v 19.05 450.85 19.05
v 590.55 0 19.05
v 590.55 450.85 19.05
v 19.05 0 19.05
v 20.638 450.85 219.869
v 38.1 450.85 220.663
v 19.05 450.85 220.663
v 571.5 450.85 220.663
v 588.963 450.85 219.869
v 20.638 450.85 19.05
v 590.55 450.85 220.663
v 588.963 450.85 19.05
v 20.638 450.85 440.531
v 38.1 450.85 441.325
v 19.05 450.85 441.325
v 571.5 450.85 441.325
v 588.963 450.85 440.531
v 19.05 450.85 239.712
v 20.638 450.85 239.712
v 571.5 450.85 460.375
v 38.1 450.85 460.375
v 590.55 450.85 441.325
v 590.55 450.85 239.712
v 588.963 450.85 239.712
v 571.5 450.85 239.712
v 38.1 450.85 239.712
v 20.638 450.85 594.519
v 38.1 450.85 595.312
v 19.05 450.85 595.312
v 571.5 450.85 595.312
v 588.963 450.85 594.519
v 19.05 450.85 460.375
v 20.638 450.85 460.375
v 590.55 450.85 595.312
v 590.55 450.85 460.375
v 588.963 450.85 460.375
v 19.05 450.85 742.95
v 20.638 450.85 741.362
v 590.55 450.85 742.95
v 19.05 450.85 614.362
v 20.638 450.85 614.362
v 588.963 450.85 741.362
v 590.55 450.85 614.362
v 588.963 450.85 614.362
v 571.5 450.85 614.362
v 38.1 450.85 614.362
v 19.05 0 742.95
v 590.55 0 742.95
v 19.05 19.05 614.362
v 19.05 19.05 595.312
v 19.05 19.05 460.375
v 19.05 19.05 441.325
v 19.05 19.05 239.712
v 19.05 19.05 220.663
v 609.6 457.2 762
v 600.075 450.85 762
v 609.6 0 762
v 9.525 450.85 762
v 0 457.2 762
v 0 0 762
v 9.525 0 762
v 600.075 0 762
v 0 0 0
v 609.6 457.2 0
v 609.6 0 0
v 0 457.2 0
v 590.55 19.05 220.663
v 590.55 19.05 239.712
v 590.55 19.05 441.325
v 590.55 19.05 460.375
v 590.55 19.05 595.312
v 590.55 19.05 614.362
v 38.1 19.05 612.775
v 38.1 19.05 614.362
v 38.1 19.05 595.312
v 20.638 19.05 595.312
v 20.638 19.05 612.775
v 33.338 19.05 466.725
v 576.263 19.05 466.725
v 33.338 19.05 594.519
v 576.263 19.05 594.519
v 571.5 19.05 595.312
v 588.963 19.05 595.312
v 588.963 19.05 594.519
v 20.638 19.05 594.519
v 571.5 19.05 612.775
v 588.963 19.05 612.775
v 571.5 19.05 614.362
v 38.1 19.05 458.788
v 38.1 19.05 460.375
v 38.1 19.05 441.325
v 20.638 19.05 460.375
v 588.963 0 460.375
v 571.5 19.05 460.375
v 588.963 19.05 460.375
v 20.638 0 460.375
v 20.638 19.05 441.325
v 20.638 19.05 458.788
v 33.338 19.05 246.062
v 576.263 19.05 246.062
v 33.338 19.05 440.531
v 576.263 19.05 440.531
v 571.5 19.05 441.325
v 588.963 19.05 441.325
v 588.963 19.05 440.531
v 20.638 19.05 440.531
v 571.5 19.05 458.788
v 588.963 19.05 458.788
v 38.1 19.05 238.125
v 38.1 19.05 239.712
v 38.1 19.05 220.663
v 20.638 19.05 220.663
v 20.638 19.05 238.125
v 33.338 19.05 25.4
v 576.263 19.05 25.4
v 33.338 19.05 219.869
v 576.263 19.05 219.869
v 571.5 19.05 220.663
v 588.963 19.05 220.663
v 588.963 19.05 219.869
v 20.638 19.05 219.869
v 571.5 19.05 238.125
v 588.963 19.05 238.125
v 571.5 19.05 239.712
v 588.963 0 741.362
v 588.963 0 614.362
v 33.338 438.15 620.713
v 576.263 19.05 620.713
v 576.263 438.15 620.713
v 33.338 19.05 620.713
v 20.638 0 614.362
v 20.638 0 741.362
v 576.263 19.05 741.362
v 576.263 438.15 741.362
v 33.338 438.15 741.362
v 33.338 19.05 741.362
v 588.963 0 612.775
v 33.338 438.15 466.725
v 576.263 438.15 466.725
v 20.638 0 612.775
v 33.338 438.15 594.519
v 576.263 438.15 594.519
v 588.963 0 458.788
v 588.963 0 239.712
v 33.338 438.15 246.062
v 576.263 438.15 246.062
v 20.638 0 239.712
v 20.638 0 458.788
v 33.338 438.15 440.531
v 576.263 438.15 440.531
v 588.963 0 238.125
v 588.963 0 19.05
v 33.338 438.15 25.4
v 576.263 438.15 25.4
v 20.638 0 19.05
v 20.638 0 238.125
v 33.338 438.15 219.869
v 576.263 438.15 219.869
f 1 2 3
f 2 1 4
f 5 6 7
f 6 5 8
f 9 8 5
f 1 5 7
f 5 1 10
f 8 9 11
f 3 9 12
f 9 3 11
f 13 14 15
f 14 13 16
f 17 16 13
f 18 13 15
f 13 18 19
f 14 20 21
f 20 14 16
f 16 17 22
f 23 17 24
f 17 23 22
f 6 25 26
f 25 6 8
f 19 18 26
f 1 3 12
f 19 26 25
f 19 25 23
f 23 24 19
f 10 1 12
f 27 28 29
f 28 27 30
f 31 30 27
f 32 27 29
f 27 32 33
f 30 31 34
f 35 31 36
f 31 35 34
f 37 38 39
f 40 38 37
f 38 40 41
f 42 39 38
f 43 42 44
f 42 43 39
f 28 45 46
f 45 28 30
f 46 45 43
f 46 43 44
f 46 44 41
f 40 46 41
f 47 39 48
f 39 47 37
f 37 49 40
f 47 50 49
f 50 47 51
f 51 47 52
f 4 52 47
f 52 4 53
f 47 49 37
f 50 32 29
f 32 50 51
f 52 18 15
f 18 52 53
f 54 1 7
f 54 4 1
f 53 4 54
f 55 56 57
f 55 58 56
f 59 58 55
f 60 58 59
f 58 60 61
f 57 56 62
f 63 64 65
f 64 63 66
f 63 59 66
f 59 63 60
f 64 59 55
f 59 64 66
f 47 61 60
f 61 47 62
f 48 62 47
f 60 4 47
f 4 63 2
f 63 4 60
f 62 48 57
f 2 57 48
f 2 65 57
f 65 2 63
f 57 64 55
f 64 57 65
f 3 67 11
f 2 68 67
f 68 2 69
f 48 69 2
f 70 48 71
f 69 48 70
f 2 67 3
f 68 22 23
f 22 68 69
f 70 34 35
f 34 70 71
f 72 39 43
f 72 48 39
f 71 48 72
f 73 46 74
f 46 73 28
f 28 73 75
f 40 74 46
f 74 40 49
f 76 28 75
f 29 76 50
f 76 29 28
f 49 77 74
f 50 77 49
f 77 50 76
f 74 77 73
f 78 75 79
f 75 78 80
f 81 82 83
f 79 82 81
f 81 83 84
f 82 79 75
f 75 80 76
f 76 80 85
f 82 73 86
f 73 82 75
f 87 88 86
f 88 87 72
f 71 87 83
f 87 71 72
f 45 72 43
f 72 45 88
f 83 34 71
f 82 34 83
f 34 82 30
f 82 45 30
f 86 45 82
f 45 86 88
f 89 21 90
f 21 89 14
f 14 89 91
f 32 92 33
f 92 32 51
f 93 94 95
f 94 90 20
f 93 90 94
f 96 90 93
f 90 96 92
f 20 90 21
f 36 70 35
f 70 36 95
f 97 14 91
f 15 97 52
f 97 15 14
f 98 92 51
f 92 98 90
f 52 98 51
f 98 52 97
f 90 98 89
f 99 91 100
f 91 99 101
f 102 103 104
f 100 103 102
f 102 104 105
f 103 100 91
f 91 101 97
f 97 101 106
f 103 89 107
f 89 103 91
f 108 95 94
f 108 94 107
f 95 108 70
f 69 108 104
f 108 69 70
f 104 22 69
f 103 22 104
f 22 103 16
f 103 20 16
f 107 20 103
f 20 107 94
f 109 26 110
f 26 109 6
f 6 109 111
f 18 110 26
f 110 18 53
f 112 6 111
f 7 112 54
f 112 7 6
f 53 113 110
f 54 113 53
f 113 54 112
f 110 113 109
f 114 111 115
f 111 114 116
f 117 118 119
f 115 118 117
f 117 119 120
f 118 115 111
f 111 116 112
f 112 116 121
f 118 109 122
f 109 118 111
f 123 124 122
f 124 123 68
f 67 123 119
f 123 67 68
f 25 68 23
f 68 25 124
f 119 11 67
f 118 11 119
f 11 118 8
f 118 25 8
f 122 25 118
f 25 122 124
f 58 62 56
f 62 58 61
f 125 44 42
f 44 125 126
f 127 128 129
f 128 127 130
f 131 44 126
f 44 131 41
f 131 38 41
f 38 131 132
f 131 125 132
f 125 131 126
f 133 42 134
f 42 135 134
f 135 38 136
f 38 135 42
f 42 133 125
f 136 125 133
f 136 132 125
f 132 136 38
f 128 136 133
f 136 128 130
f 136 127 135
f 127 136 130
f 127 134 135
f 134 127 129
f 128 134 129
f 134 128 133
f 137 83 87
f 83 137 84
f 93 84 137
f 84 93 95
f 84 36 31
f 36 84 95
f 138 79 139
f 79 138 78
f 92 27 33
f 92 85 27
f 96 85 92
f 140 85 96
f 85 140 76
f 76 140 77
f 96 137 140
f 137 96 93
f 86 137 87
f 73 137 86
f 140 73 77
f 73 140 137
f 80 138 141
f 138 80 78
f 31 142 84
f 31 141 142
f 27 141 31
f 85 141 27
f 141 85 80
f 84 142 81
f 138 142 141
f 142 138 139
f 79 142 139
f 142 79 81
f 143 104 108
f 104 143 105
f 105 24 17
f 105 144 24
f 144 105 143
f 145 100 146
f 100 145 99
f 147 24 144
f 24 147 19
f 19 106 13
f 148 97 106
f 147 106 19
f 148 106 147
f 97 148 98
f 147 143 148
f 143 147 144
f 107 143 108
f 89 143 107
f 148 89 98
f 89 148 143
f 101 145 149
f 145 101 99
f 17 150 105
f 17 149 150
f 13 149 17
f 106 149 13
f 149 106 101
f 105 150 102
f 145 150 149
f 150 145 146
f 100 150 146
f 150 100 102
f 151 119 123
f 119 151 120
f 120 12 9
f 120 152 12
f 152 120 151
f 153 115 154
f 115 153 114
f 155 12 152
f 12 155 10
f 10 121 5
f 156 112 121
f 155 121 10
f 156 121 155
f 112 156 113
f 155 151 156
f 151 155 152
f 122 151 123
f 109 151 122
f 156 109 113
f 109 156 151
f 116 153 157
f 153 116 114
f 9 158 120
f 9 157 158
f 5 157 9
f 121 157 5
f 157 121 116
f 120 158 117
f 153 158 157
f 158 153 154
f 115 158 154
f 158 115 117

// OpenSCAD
// Drawer cabinet — a frameless plywood case with a single column of inset
// drawers running on wooden runners. Drawer 1 is the top drawer.
// Inputs are inches; geometry and STL exports are millimetres.
// Origin is the case's front-bottom-left corner: X across the width,
// Y from the front face (Y=0) towards the back, Z up.

/* [Carcass] */
// Outside width of the case.
Width = 24; // [8:96]
// Outside height of the case.
Height = 30; // [6:96]
// Outside depth of the case, including the back panel.
Depth = 18; // [6:36]
// Plywood thickness for the sides, top and bottom.
Case_thickness = 0.75; // [0.25:1.5]
// How the top and bottom meet the sides. Butt joints suit screws or pocket screws; rabbets house the panels in the side ends.
Case_joinery = "rabbet"; // [butt:Butt joints between the sides, rabbet:Top and bottom in side rabbets]
// Back panel thickness. It sits in rabbets along the back of both sides and covers the back edges of the top and bottom.
Back_thickness = 0.25; // [0.125:0.75]
// Depth of each back rabbet into the side, measured across the side's thickness.
Back_rabbet_width = 0.375; // [0.0625:1.25]

/* [Drawer layout] */
// Drawers stacked in the single column. Each drawer has its own settings below.
Drawer_count = 4; // [1:1:8]
// Gap around each inset front: above, between and beside the drawers. Side-hung drawers also get the gap below the bottom drawer.
Reveal = 0.0625; // [0:0.25]
// Space left behind drawers with automatic depth. Zero lets the back panel act as the drawer stop.
Back_clearance = 0; // [0:6]

/* [Drawer boxes] */
// Butt-jointed box: glue with screws, pocket screws or brads. Fasteners are not modelled.
Box_construction = "front_back_overlap"; // [sides_overlap:Sides full length / bottom nailed under, front_back_overlap:Front and back full width / bottom nailed under, sides_overlap_groove:Sides full length / bottom in a groove]
// Integral drawer front; it is the inset face seen in the opening.
Front_thickness = 0.75; // [0.25:1.5]
// Drawer side thickness.
Side_thickness = 0.5; // [0.25:1]
// Drawer back thickness.
Box_back_thickness = 0.5; // [0.25:1]
// Drawer bottom thickness.
Bottom_thickness = 0.25; // [0.125:0.75]
// Bottom groove depth into the sides and front. Grooved bottoms only.
Groove_depth = 0.25; // [0.0625:0.5]
// Height of the bottom groove above the box underside. Grooved bottoms only.
Groove_offset = 0.25; // [0.0625:2]

/* [Runners] */
// Strips and dadoed strips carry each drawer on its underside, and the strip above stops it tipping. The bottom drawer runs on the case bottom. Side-hung drawers ride on strips engaging grooves in their sides.
Runner_style = "strip"; // [strip:Strips screwed to the case sides, dado:Strips housed in case-side dados, side_hung:Side-hung in drawer-side grooves]
// Vertical size of each runner strip.
Runner_height = 0.75; // [0.25:2]
// How far a supporting strip projects from the case side. Strip and dado runners only.
Runner_width = 0.75; // [0.125:2]
// Dado depth into the case side; the strip is this much wider. Dado runners only.
Runner_dado_depth = 0.25; // [0.0625:0.75]
// Groove depth in each drawer side for side-hung runners.
Hang_groove_depth = 0.25; // [0.0625:0.75]
// Running clearance: below the strip above a supported drawer, and around a side-hung strip in its groove.
Runner_clearance = 0.03125; // [0:0.125]

/* [Drawer 1 (top)] */
// Inset front height. Zero shares the remaining height equally with other zero-height drawers.
Drawer_1_height = 5; // [0:60]
// Box depth from the front face. Zero fills the case depth less the back clearance.
Drawer_1_depth = 0; // [0:36]

/* [Drawer 2] */
// Inset front height. Zero shares the remaining height equally with other zero-height drawers.
Drawer_2_height = 6; // [0:60]
// Box depth from the front face. Zero fills the case depth less the back clearance.
Drawer_2_depth = 0; // [0:36]

/* [Drawer 3] */
// Inset front height. Zero shares the remaining height equally with other zero-height drawers.
Drawer_3_height = 0; // [0:60]
// Box depth from the front face. Zero fills the case depth less the back clearance.
Drawer_3_depth = 0; // [0:36]

/* [Drawer 4] */
// Inset front height. Zero shares the remaining height equally with other zero-height drawers.
Drawer_4_height = 0; // [0:60]
// Box depth from the front face. Zero fills the case depth less the back clearance.
Drawer_4_depth = 0; // [0:36]

/* [Drawer 5] */
// Inset front height. Zero shares the remaining height equally with other zero-height drawers.
Drawer_5_height = 0; // [0:60]
// Box depth from the front face. Zero fills the case depth less the back clearance.
Drawer_5_depth = 0; // [0:36]

/* [Drawer 6] */
// Inset front height. Zero shares the remaining height equally with other zero-height drawers.
Drawer_6_height = 0; // [0:60]
// Box depth from the front face. Zero fills the case depth less the back clearance.
Drawer_6_depth = 0; // [0:36]

/* [Drawer 7] */
// Inset front height. Zero shares the remaining height equally with other zero-height drawers.
Drawer_7_height = 0; // [0:60]
// Box depth from the front face. Zero fills the case depth less the back clearance.
Drawer_7_depth = 0; // [0:36]

/* [Drawer 8] */
// Inset front height. Zero shares the remaining height equally with other zero-height drawers.
Drawer_8_height = 0; // [0:60]
// Box depth from the front face. Zero fills the case depth less the back clearance.
Drawer_8_depth = 0; // [0:36]

/* [Inspection] */
// Separation in percent: 0 assembles the cabinet; 100 opens the case and slides the drawers clear; 200 also takes the drawers apart. A single drawer separates from 0. Part sizes stay fixed.
Explosion_percent = 0; // [0:5:200]
// Show the complete cabinet, the case with its runners, or one drawer for inspection and a separate STL export.
Part = "all"; // [all:Complete cabinet, carcass:Case and runners, drawer:One drawer]
// Drawer shown when Part is One drawer; 1 is the top drawer.
Inspect_drawer = 1; // [1:1:8]

/* [Hidden] */
inch = 25.4;
eps = 0.01 / inch; // Boolean-tool overrun, 0.01 mm.
max_drawers = 8;
N = Drawer_count;
t = Case_thickness;
end_rabbet = t / 2; // Side-end rabbet depth when the top and bottom are housed.
inner_w = Width - 2 * t;
inner_h = Height - 2 * t;
inner_d = Depth - Back_thickness; // Front face to the back panel.
supported = Runner_style != "side_hung";
dadoed = Runner_style == "dado";
under_bottom = Box_construction != "sides_overlap_groove";

function sumv(v, i = 0) = i >= len(v) ? 0 : v[i] + sumv(v, i + 1);

height_inputs = [Drawer_1_height, Drawer_2_height, Drawer_3_height, Drawer_4_height,
                 Drawer_5_height, Drawer_6_height, Drawer_7_height, Drawer_8_height];
depth_inputs = [Drawer_1_depth, Drawer_2_depth, Drawer_3_depth, Drawer_4_depth,
                Drawer_5_depth, Drawer_6_depth, Drawer_7_depth, Drawer_8_depth];
// Supported drawers have a reveal above each front; side-hung drawers also have one below the bottom drawer.
reveal_count = supported ? N : N + 1;
front_space = inner_h - reveal_count * Reveal;
fixed_height = sumv([for (i = [0:N-1]) height_inputs[i]]);
auto_count = len([for (i = [0:N-1]) if (height_inputs[i] == 0) 1]);
auto_height = auto_count > 0 ? (front_space - fixed_height) / auto_count : 0;
front_h = [for (i = [0:N-1]) height_inputs[i] > 0 ? height_inputs[i] : auto_height];
// Front bottoms measured from the case bottom's top surface (interior floor).
base = supported ? 0 : Reveal;
front_z = [for (i = [0:N-1]) base + sumv([for (j = [i+1:1:N-1]) front_h[j]]) + (N - 1 - i) * Reveal];
full_depth = inner_d - Back_clearance;
box_d = [for (i = [0:N-1]) depth_inputs[i] > 0 ? depth_inputs[i] : full_depth];
box_w = inner_w - 2 * Reveal;
// Box side height: supported drawers stop below the runner strip that carries the drawer above.
box_h = [for (i = [0:N-1])
    !supported ? front_h[i] :
    min(front_h[i], (i == 0 ? inner_h : front_z[i-1] - Runner_height) - Runner_clearance - front_z[i])];
// Side extent above the box underside, and the side-hung groove centred on it.
side_lo = under_bottom ? Bottom_thickness : 0;
hang_groove_h = Runner_height + Runner_clearance;
hang_center = [for (i = [0:N-1]) (side_lo + box_h[i]) / 2];
runner_reach = supported ? Runner_width : Reveal + Hang_groove_depth - Runner_clearance;
dado_depth = dadoed ? Runner_dado_depth : 0;

// Inches to the nearest 1/64 with an inch mark; "≈" marks values that are not exact 64ths.
function frac(x) = let(sign = x < 0 ? "-" : "", a = abs(x), w = floor(a + 1/128),
    n = round((a - w) * 64), g = gcd(n, 64), approx = abs(a - w - n / 64) > 1e-6)
    str(approx ? "≈" : "", sign, n == 0 ? str(w) : w == 0 ? str(n/g, "/", 64/g) : str(w, " ", n/g, "/", 64/g), "″");
function gcd(a, b) = b == 0 ? a : gcd(b, a % b);

assert(Width >= 8 && Width <= 96 && Height >= 6 && Height <= 96 && Depth >= 6 && Depth <= 36,
    "Case must be 8–96 inches wide, 6–96 tall and 6–36 deep.");
assert(t >= 0.25 && t <= 1.5, "Case thickness must be between 1/4 and 1 1/2 inches.");
assert(Case_joinery == "butt" || Case_joinery == "rabbet", "Choose a case joint.");
assert(Back_thickness >= 0.125 && Back_thickness <= 0.75 && Back_thickness < Depth / 2,
    "Back thickness must be between 1/8 and 3/4 inch.");
assert(Back_rabbet_width > 0 && Back_rabbet_width < t, "Back rabbet width must be less than the case thickness.");
assert(N >= 1 && N <= max_drawers && floor(N) == N, "Drawer count must be a whole number from 1 to 8.");
assert(Reveal >= 0 && Reveal <= 0.25, "Reveal must be between 0 and 1/4 inch.");
assert(Back_clearance >= 0, "Back clearance cannot be negative.");
assert(Box_construction == "sides_overlap" || Box_construction == "front_back_overlap" ||
    Box_construction == "sides_overlap_groove", "Choose a drawer box construction.");
assert(Runner_style == "strip" || Runner_style == "dado" || Runner_style == "side_hung", "Choose a runner style.");
assert(Runner_height > 0 && Runner_width > 0 && Runner_clearance >= 0, "Runner sizes must be positive.");
assert(min([for (i = [0:N-1]) height_inputs[i]]) >= 0, "Drawer heights cannot be negative.");
assert(min([for (i = [0:N-1]) depth_inputs[i]]) >= 0, "Drawer depths cannot be negative.");
assert(auto_count > 0 || abs(fixed_height - front_space) < 1e-6,
    str("With every drawer height set, the fronts must total ", frac(front_space),
        " (they total ", frac(fixed_height), "). Set one drawer to 0 to take up the difference."));
assert(auto_count == 0 || auto_height >= 1,
    str("The set drawer heights leave ", frac(front_space - fixed_height), " for ", auto_count,
        auto_count == 1 ? " drawer" : " drawers", " set to 0; each needs at least 1″. Reduce a set height or the drawer count."));
assert(box_w > 2 * Side_thickness + 1, "The case is too narrow for the drawer sides.");
assert(full_depth >= Front_thickness + Box_back_thickness + 1, "Back clearance leaves too little drawer depth.");
for (i = [0:N-1]) {
    assert(box_d[i] <= full_depth + 1e-6,
        str("Drawer ", i + 1, " depth exceeds the ", frac(full_depth), " available behind the front."));
    assert(box_d[i] >= Front_thickness + Box_back_thickness + 1, str("Drawer ", i + 1, " is too shallow."));
    assert(box_h[i] >= side_lo + (under_bottom ? 0 : Groove_offset + Bottom_thickness) + 0.5,
        str("Drawer ", i + 1, " leaves its sides only ", frac(box_h[i]),
            " tall below the runner above. Increase its height or reduce the runner height."));
}
assert(!supported || Runner_width > Reveal, "Supporting runners must project past the reveal to carry the drawer.");
assert(!dadoed || Runner_dado_depth < t, "Runner dados must be shallower than the case thickness.");
assert(supported || (Hang_groove_depth > Runner_clearance && Hang_groove_depth < Side_thickness),
    "Side-hung grooves must be deeper than the clearance and shallower than the drawer sides.");
assert(supported || min([for (i = [0:N-1]) box_h[i] - side_lo - hang_groove_h]) >= 0.25,
    "Side-hung grooves need at least 1/4 inch of side material above and below them.");
assert(under_bottom || (Groove_depth < Side_thickness && Groove_depth < Front_thickness &&
    Groove_offset + Bottom_thickness < min(box_h)),
    "The bottom groove must fit inside the drawer sides and front.");
assert(under_bottom || supported || Groove_depth + Hang_groove_depth < Side_thickness ||
    min([for (i = [0:N-1]) hang_center[i] - hang_groove_h / 2 - Groove_offset - Bottom_thickness]) > 0,
    "The bottom and runner grooves overlap through the drawer side.");
assert(is_num(Explosion_percent) && Explosion_percent >= 0 && Explosion_percent <= 200,
    "Explosion must be between 0 and 200 percent.");
assert(Part == "all" || Part == "carcass" || Part == "drawer", "Choose a part to show.");
assert(Part != "drawer" || (Inspect_drawer >= 1 && Inspect_drawer <= N && floor(Inspect_drawer) == Inspect_drawer),
    str("Choose a drawer from 1 to ", N, "."));

// Colors identify physical members; alternate drawers use paired hues so
// adjacent drawers stay distinguishable.
case_colors = ["#2c78b5", "#3998a5", "#5d6b7c", "#7a6f4e", "#9a8f80"]; // left, right, top, bottom, back
// Legend colors as 0-255 RGB. Pieces sharing a legend color get their own
// source color within 3/255 of it, so the viewer can select each one while
// showing the legend color.
runner_rgb = [47, 122, 79];
front_rgb = [[184, 121, 36], [182, 72, 59]];
side_rgb = [[174, 104, 157], [112, 101, 175]];
back_rgb = [[149, 109, 112], [93, 124, 146]];
bottom_rgb = [[138, 138, 58], [71, 133, 109]];
// Piece k of a legend color: base-4 digits of k nudge red, green and blue.
function shade(base, k) = [for (c = [0:2]) let(d = floor(k / pow(4, c)) % 4) base[c] + (base[c] > 250 ? -d : d)];
function hex2(n) = str("0123456789abcdef"[floor(n / 16)], "0123456789abcdef"[n % 16]);
function hex_color(c) = str("#", hex2(c[0]), hex2(c[1]), hex2(c[2]));
function runner_rgb_of(i, right) = shade(runner_rgb, 2 * i + (right ? 1 : 0));

echo(str("Case: ", frac(Width), " wide x ", frac(Height), " tall x ", frac(Depth), " deep"));
echo(str("Opening: ", frac(inner_w), " x ", frac(inner_h), "; ", frac(inner_d), " to the back panel"));
for (i = [0:N-1]) echo(str("Drawer ", i + 1, ": front ", frac(box_w), " x ", frac(front_h[i]),
    "; box ", frac(box_w), " wide x ", frac(box_d[i]), " deep, sides ", frac(box_h[i] - side_lo), " tall"));

module box(lo, hi) {
    // Convert before boolean operations: the engine's tolerances suit millimetres.
    translate(lo * inch) cube((hi - lo) * inch);
}

// Case parts, in place.
// X interval cutting into a case side from its inside face.
function into_side(right, depth) = right ? [Width - t - eps, Width - t + depth] : [t - depth, t + eps];
module case_side(right) {
    x0 = right ? Width - t : 0;
    difference() {
        box([x0, 0, 0], [x0 + t, Depth, Height]);
        // Back rabbet, through the full height.
        let(x = into_side(right, Back_rabbet_width))
            box([x[0], inner_d, -eps], [x[1], Depth + eps, Height + eps]);
        // End rabbets stop at the back rabbet; the back panel covers the panels' back edges.
        if (Case_joinery == "rabbet") for (z = [[-eps, t], [Height - t, Height + eps]])
            let(x = into_side(right, end_rabbet)) box([x[0], -eps, z[0]], [x[1], inner_d, z[1]]);
        // Stopped runner dados, hidden behind the drawer fronts.
        if (dadoed) for (i = [0:1:N-2])
            let(x = into_side(right, dado_depth))
                box([x[0], Front_thickness, t + front_z[i] - Runner_height], [x[1], inner_d, t + front_z[i]]);
    }
}
module case_panel(top) {
    overlap = Case_joinery == "rabbet" ? end_rabbet : 0;
    z = top ? Height - t : 0;
    box([t - overlap, 0, z], [Width - t + overlap, inner_d, z + t]);
}
module case_back() box([t - Back_rabbet_width, inner_d, 0], [Width - t + Back_rabbet_width, Depth, Height]);

// Bearing height of drawer i's runners: a supported drawer's underside rests on
// the strip top; a side-hung drawer's groove ceiling rests on it.
function runner_top(i) = t + front_z[i] + (supported ? 0 : hang_center[i] + hang_groove_h / 2);
// Runner strips for drawer i (0 = top); left and right.
module runner(i, right) {
    y = [Front_thickness, inner_d];
    z = [runner_top(i) - Runner_height, runner_top(i)];
    if (right) box([Width - t - runner_reach, y[0], z[0]], [Width - t + dado_depth, y[1], z[1]]);
    else box([t - dado_depth, y[0], z[0]], [t + runner_reach, y[1], z[1]]);
}
runner_drawers = supported ? [for (i = [0:1:N-2]) i] : [for (i = [0:N-1]) i];

// Drawer i in local coordinates: front face at Y=0, underside at Z=0, left side at X=0.
// Members are listed as [name, lo, hi]; grooves are subtracted afterwards.
function drawer_members(i) = let(
    w = box_w, d = box_d[i], h = box_h[i], fh = front_h[i],
    tf = Front_thickness, ts = Side_thickness, tk = Box_back_thickness, tb = Bottom_thickness,
    g = Groove_depth, o = Groove_offset)
    Box_construction == "sides_overlap" ? [
        ["bottom", [0, 0, 0], [w, d, tb]],
        ["front", [ts, 0, tb], [w - ts, tf, fh]],
        ["left", [0, 0, tb], [ts, d, h]],
        ["right", [w - ts, 0, tb], [w, d, h]],
        ["back", [ts, d - tk, tb], [w - ts, d, h]]] :
    Box_construction == "front_back_overlap" ? [
        ["bottom", [0, 0, 0], [w, d, tb]],
        ["front", [0, 0, tb], [w, tf, fh]],
        ["left", [0, tf, tb], [ts, d - tk, h]],
        ["right", [w - ts, tf, tb], [w, d - tk, h]],
        ["back", [0, d - tk, tb], [w, d, h]]] : [
        ["bottom", [ts - g, tf - g, o], [w - ts + g, d, o + tb]],
        ["front", [ts, 0, 0], [w - ts, tf, fh]],
        ["left", [0, 0, 0], [ts, d, h]],
        ["right", [w - ts, 0, 0], [w, d, h]],
        ["back", [ts, d - tk, o + tb], [w - ts, d, h]]];

// Alternate drawers alternate legend colors; drawers sharing one are distinct pieces.
function member_rgb(name, i) = let(k = i % 2, n = floor(i / 2))
    name == "front" ? shade(front_rgb[k], n) : name == "back" ? shade(back_rgb[k], n) :
    name == "bottom" ? shade(bottom_rgb[k], n) : shade(side_rgb[k], 2 * n + (name == "right" ? 1 : 0));

module drawer_member(i, m) {
    w = box_w; d = box_d[i]; tf = Front_thickness; ts = Side_thickness;
    g = Groove_depth; o = Groove_offset; tb = Bottom_thickness;
    difference() {
        box(m[1], m[2]);
        if (!under_bottom && m[0] != "bottom" && m[0] != "back")
            box([ts - g, tf - g, o], [w - ts + g, d + eps, o + tb]);
        if (!supported) for (x = [[-eps, Hang_groove_depth], [w - Hang_groove_depth, w + eps]])
            box([x[0], tf, hang_center[i] - hang_groove_h / 2], [x[1], d + eps, hang_center[i] + hang_groove_h / 2]);
    }
}

// Exploded offsets in inches at 100 percent.
case_offsets = [[-4, 0, 0], [4, 0, 0], [0, 0, 4], [0, 0, -4], [0, 4, 0]];
function member_offset(name) =
    name == "front" ? [0, -1.5, 0] : name == "back" ? [0, 1.5, 0] : name == "bottom" ? [0, 0, -1.5] :
    name == "left" ? [-1.5, 0, 0] : [1.5, 0, 0];

module drawer(i, e) {
    for (m = drawer_members(i))
        color(member_rgb(m[0], i) / 255) translate(member_offset(m[0]) * e * inch) drawer_member(i, m);
}
module carcass(e) {
    color(case_colors[0]) translate(case_offsets[0] * e * inch) case_side(false);
    color(case_colors[1]) translate(case_offsets[1] * e * inch) case_side(true);
    color(case_colors[2]) translate(case_offsets[2] * e * inch) case_panel(true);
    color(case_colors[3]) translate(case_offsets[3] * e * inch) case_panel(false);
    color(case_colors[4]) translate(case_offsets[4] * e * inch) case_back();
    // Runners move half as far as their side, exposing the seat or dado.
    for (i = runner_drawers) for (right = [false, true]) color(runner_rgb_of(i, right) / 255)
        translate(case_offsets[right ? 1 : 0] * e / 2 * inch) runner(i, right);
}
module cabinet(e) {
    carcass(e);
    // Up to 100 percent the case opens and the drawers slide out whole until they clear it;
    // beyond that the drawers spread apart vertically and their own parts separate.
    slide = min(e, 1);
    spread = max(e - 1, 0);
    for (i = [0:N-1])
        translate([t + Reveal, -(max(box_d) + 3) * slide, t + front_z[i] + 3 * (N - 1 - i) * spread] * inch)
            drawer(i, spread);
}

// ---------------------------------------------------------------------------
// Dimensioned drawings for the private $misc_drawing pass. Witnesses are model
// inches; dp() converts them to whole millimetres plus millionths so inch
// fractions survive echo's six significant digits.
function dp(p) = [for (n = p * inch) [floor(n), round((n - floor(n)) * 1000000)]];
function dim(label, a, b, direction, side, tier = 1) = [label, dp(a), dp(b), direction, side, tier];
function guide(a, b) = [dp(a), dp(b)];
function section(depth, crop, breaks = [], notes = [], contacts = []) =
    [dp([depth, 0, 0])[0], [for (n = crop) dp([n, 0, 0])[0]], breaks, notes, contacts];
function join(v, i = 0) = i >= len(v) ? "" : str(i > 0 ? ", " : "", v[i], join(v, i + 1));

FRONT = [[1, 0, 0], [0, 0, 1], [0, -1, 0]]; // Looking at the front face.
TOP = [[1, 0, 0], [0, 1, 0], [0, 0, 1]];    // Looking down; the back is at the top.
RIGHT = [[0, 1, 0], [0, 0, 1], [1, 0, 0]];  // From +X; the front is at the left.
LEFT = [[0, -1, 0], [0, 0, 1], [-1, 0, 0]]; // From -X; the front is at the right.
FLAT = [[0, 0, 1], [0, -1, 0], [1, 0, 0]];  // From +X, laid flat: bottom edge at the left, front edge up.

// Every physical piece gets its own drawing color (exact binary fractions) so a
// part sheet can select exactly one mesh: case 0-4, runners 5-20, drawers 21+.
function pc(p) = [(p % 8) / 8, floor(p / 8) / 8, 0.25];
function runner_piece(i, right) = 5 + 2 * i + (right ? 1 : 0);
function member_piece(i, m) = 21 + 5 * i + m;
function drawer_origin(i) = [t + Reveal, 0, t + front_z[i]];

module drawing_cabinet() {
    color(pc(0)) case_side(false);
    color(pc(1)) case_side(true);
    color(pc(2)) case_panel(true);
    color(pc(3)) case_panel(false);
    color(pc(4)) case_back();
    for (i = runner_drawers) for (right = [false, true]) color(pc(runner_piece(i, right))) runner(i, right);
    for (i = [0:N-1]) let(members = drawer_members(i)) for (m = [0:4])
        color(pc(member_piece(i, m))) translate(drawer_origin(i) * inch) drawer_member(i, members[m]);
}

// Assembly views.
assembly_views = [
    ["front", "Front / D1 is the top drawer", FRONT, concat([
        dim("Overall width", [0, 0, Height], [Width, 0, Height], "horizontal", 1),
        dim("Opening width", [t, 0, 0], [Width - t, 0, 0], "horizontal", -1),
        dim("Overall height", [0, 0, 0], [0, 0, Height], "vertical", -1, 2),
        dim("Opening height", [0, 0, t], [0, 0, Height - t], "vertical", -1)],
        [for (i = [0:N-1]) dim(str("D", i + 1), [Width, 0, t + front_z[i]], [Width, 0, t + front_z[i] + front_h[i]], "vertical", 1)])],
    ["top", "Top", TOP, [dim("Overall depth", [0, 0, Height], [0, Depth, Height], "vertical", -1)]],
    ["right", "Right end", RIGHT, [dim("Overall depth", [Width, 0, 0], [Width, Depth, 0], "horizontal", -1)]]
];

// Runner detail: sections at the left runner carrying drawer 1, or under a lone drawer.
two = N >= 2;
bearing_z = runner_top(0);
section_y = Front_thickness + (min(box_d) - Front_thickness - Box_back_thickness) / 2;
section_x = t + Reveal + (supported ? min(0.4 * Side_thickness, (Runner_width - Reveal) / 2) : Hang_groove_depth / 2);
detail_v = [supported && !two ? -0.25 : bearing_z - Runner_height - 1, bearing_z + (supported ? 1.5 : 1)];
detail_breaks = supported && !two ? ["top", "right"] : ["top", "bottom", "right"];
transverse_u = [-0.25, t + max(runner_reach, Reveal + Side_thickness) + 1];
bearing_x = !supported ? t + runner_reach :
    two ? (under_bottom ? t + Runner_width : t + min(Runner_width, Reveal + Side_thickness)) :
    (under_bottom ? transverse_u[1] : t + Reveal + Side_thickness);
lower_clearance = two && supported ? bearing_z - Runner_height - (t + front_z[1] + box_h[1]) : 0;
joint_views = let(y = section_y, x = section_x, z = bearing_z, rh = Runner_height) [
    ["joint-longitudinal", "A-A / Along the drawer side", RIGHT, concat(
        two || !supported ? [dim("Runner start", [x, 0, z], [x, Front_thickness, z], "horizontal", -1)]
                          : [dim("Case bottom", [x, 0, 0], [x, 0, t], "vertical", -1)]),
     section(x, [-0.25, detail_v[0], Front_thickness + 3, detail_v[1]], detail_breaks,
        [two || !supported ? "Runners start behind the drawer fronts." : "The drawer runs on the case bottom.",
         Back_clearance == 0 ? "The back panel stops the drawers." : "Fit drawer stops; none are modelled."],
        [guide([x, two || !supported ? Front_thickness : 0, z], [x, Front_thickness + 3, z])])],
    ["joint-transverse", "B-B / Across the runner", FRONT, concat(
        [dim("Case side", [0, y, detail_v[1]], [t, y, detail_v[1]], "horizontal", 1)],
        Reveal > 0 ? [dim("Reveal", [t, y, z], [t + Reveal, y, z], "horizontal", 1, 2)] : [],
        !supported ? [
            dim("Runner reach", [t, y, z - rh], [t + runner_reach, y, z - rh], "horizontal", -1),
            dim("Groove depth", [t + Reveal, y, z], [t + Reveal + Hang_groove_depth, y, z], "horizontal", -1, 2),
            dim("Runner height", [t, y, z - rh], [t, y, z], "vertical", -1),
            dim("Groove height", [t + Reveal + Hang_groove_depth, y, z - hang_groove_h], [t + Reveal + Hang_groove_depth, y, z], "vertical", 1)] :
        two ? concat([
            dim(dadoed ? "Runner width" : "Runner projection", [t - dado_depth, y, z - rh], [t + Runner_width, y, z - rh], "horizontal", -1),
            dim("Runner height", [t, y, z - rh], [t, y, z], "vertical", -1)],
            dadoed ? [dim("Dado depth", [t - dado_depth, y, z], [t, y, z], "horizontal", -1, 2)] : [],
            lower_clearance > 1e-6 ? [dim("Clearance", [t + Reveal, y, z - rh - lower_clearance], [t + Reveal, y, z - rh], "vertical", 1)] : []) :
        [dim("Case bottom", [0, y, 0], [0, y, t], "vertical", -1)]),
     section(-y, [transverse_u[0], detail_v[0], transverse_u[1], detail_v[1]], detail_breaks,
        !supported ? [str("Runner ", frac(rh), " x ", frac(runner_reach), ", screwed to the case side."),
                      str("It stops ", frac(Runner_clearance), " short of the groove floor.")] :
        two ? [str("Runner ", frac(rh), " x ", frac(Runner_width + dado_depth),
                   dadoed ? str(", glued into a ", frac(dado_depth), " dado.") : ", screwed to the case side."),
               str("Drawer 2 clears the runner above by ", frac(lower_clearance), ".")] :
        ["A single drawer needs no runners."],
        [guide([t + Reveal, y, z], [bearing_x, y, z])])]
];
joint_caption = [
    supported && !two ? "Drawer support detail" : "Runner detail",
    str("Enlarged sections through the left ", supported && !two ? "case bottom under drawer 1" :
        two && supported ? "runner between drawers 1 and 2" : "runner of drawer 1",
        ". Hatching distinguishes parts; the right side is mirrored."),
    !supported ? "Groove top bears on the runner; the drawer hangs." :
    two ? "Drawer underside bears on the runner top." : "Drawer underside runs on the case bottom."];

// Part sheets.
runner_tops = [for (k = [len(runner_drawers) - 1:-1:0]) runner_top(runner_drawers[k])]; // Ascending.
runner_names = [for (k = [len(runner_drawers) - 1:-1:0]) str("R", runner_drawers[k] + 1)];
mid_y = (Front_thickness + inner_d) / 2;

function case_side_sheet() = let(x = t, rabbeted = Case_joinery == "rabbet", n = len(runner_tops),
    z_back = Height - t - 0.5, z_dado = n > 0 ? runner_tops[n-1] : 0,
    // Section D-D covers the top end rabbet and, for dados, down through the top dado.
    d_lo = dadoed && n > 0 ? z_dado - Runner_height - 1.25 : Height - t - 1)
    ["case-side", "Case side", 2, concat([
        str(frac(t), " plywood. The left side is shown; make the right side its mirror image."),
        rabbeted ? str("End rabbets: the top and bottom sit ", frac(end_rabbet), " into each side, ", frac(t), " high.")
                 : "The top and bottom butt between the sides.",
        str("Back rabbet ", frac(Back_rabbet_width), " into the side x ", frac(Back_thickness), ", full height.")],
        n == 0 ? [] : [
            str("Runner tops above the bottom edge: ", join([for (k = [n-1:-1:0]) str(runner_names[k], " ", frac(runner_tops[k]))]),
                ". Rk carries drawer k."),
            dadoed ? str("Stopped dados ", frac(Runner_height), " wide x ", frac(dado_depth), " deep, ",
                         frac(Front_thickness), " back from the front edge to the back rabbet.")
                   : "Dashed lines locate the runner strips; glue and screw them on."]),
     pc(0), concat([
        ["inside", "Inside face, laid flat / bottom edge at left, front edge up", FLAT, concat([
            dim("Height", [x, Depth, 0], [x, Depth, Height], "horizontal", -1, 2),
            dim("Depth", [x, 0, 0], [x, Depth, 0], "vertical", -1),
            dim("Back rabbet", [x, inner_d, Height], [x, Depth, Height], "vertical", 1)],
            rabbeted ? [dim("Rabbet", [x, Depth, 0], [x, Depth, t], "horizontal", -1),
                        dim("Rabbet", [x, Depth, Height - t], [x, Depth, Height], "horizontal", -1)] : [],
            n > 0 ? [dim("Runner start", [x, 0, Height], [x, Front_thickness, Height], "vertical", 1, 2)] : [],
            // Chained from the bottom edge to each runner top.
            [for (k = [0:1:n-1]) dim(k == 0 ? str("To ", runner_names[k]) : str(runner_names[k-1], "–", runner_names[k]),
                [x, 0, k == 0 ? 0 : runner_tops[k-1]], [x, 0, runner_tops[k]], "horizontal", 1)]),
         [], dadoed ? [] : [for (z = runner_tops) each [
            guide([x, Front_thickness, z], [x, inner_d, z]),
            guide([x, Front_thickness, z - Runner_height], [x, inner_d, z - Runner_height])]]],
        ["back-rabbet", "C-C / Section below the top, from above", TOP, [
            dim("Thickness", [0, inner_d - 1, z_back], [t, inner_d - 1, z_back], "horizontal", -1),
            dim("Back rabbet width", [t - Back_rabbet_width, Depth, z_back], [t, Depth, z_back], "horizontal", 1),
            dim("Back rabbet", [t, inner_d, z_back], [t, Depth, z_back], "vertical", 1)],
         section(z_back, [-0.25, inner_d - 1.25, t + 0.25, Depth + 0.25], ["bottom"])]],
        rabbeted || (dadoed && n > 0) ? [
        ["end", dadoed && n > 0 ? "D-D / Section through the top end and top dado" : "D-D / Section through the top end", FRONT, concat(
            [dim("Thickness", [0, mid_y, d_lo], [t, mid_y, d_lo], "horizontal", -1)],
            rabbeted ? [
                dim("End rabbet depth", [t - end_rabbet, mid_y, Height], [t, mid_y, Height], "horizontal", 1),
                dim("Rabbet height", [t, mid_y, Height - t], [t, mid_y, Height], "vertical", 1)] : [],
            dadoed && n > 0 ? [
                dim("Dado depth", [t - dado_depth, mid_y, z_dado], [t, mid_y, z_dado], "horizontal", 1, rabbeted ? 2 : 1),
                dim("Dado width", [t, mid_y, z_dado - Runner_height], [t, mid_y, z_dado], "vertical", 1)] : []),
         section(-mid_y, [-0.25, d_lo, t + 0.25, Height + 0.25], ["bottom"])]] : [])];

function panel_sheet() = let(o = Case_joinery == "rabbet" ? end_rabbet : 0, z = Height, xm = Width / 2)
    ["case-panels", "Case top and bottom", 2, [
        str(frac(t), " plywood. The top and bottom are identical."),
        o > 0 ? str("Their ends fit the side rabbets, ", frac(o), " each side.") : "They butt between the sides.",
        "The back panel covers their back edges."],
     pc(2), [
        ["plan", "Plan", TOP, [
            dim("Width", [t - o, 0, z], [Width - t + o, 0, z], "horizontal", -1),
            dim("Depth", [t - o, 0, z], [t - o, inner_d, z], "vertical", -1)]],
        ["edge", "E-E / Section at the front edge", RIGHT, [
            dim("Thickness", [xm, 0, z - t], [xm, 0, z], "vertical", -1)],
         section(xm, [-0.25, z - t - 0.25, 1.5, z + 0.25], ["right"])]]];

function back_sheet() = let(xm = Width / 2)
    ["back-panel", "Back panel", 1, [
        str(frac(Back_thickness), " plywood, set in the side rabbets."),
        "It covers the back edges of the top and bottom; glue and nail it on."],
     pc(4), [
        ["face", "Face", FRONT, [
            dim("Width", [t - Back_rabbet_width, Depth, Height], [Width - t + Back_rabbet_width, Depth, Height], "horizontal", 1),
            dim("Height", [t - Back_rabbet_width, Depth, 0], [t - Back_rabbet_width, Depth, Height], "vertical", -1)]],
        ["edge", "F-F / Section at the top edge", RIGHT, [
            dim("Thickness", [xm, inner_d, Height], [xm, Depth, Height], "horizontal", 1)],
         section(xm, [inner_d - 0.25, Height - 1.5, Depth + 0.25, Height + 0.25], ["bottom"])]]];

function runner_sheet() = let(i = runner_drawers[0], z = runner_top(i), x0 = t - dado_depth, x1 = t + runner_reach)
    ["runner", "Runner strip", 2 * len(runner_drawers), [
        "Hardwood. Positions are on the case side sheet.",
        Runner_style == "strip" ? "Glue and screw to the case side; the top carries the drawer." :
        dadoed ? str("Glue into the ", frac(dado_depth), "-deep dado; ", frac(Runner_width), " projects to carry the drawer.") :
        str("Engages the drawer-side groove, stopping ", frac(Runner_clearance), " short of its floor.")],
     pc(runner_piece(i, false)), [
        ["side", "Side", RIGHT, [
            dim("Length", [x1, Front_thickness, z], [x1, inner_d, z], "horizontal", 1),
            dim("Height", [x1, Front_thickness, z - Runner_height], [x1, Front_thickness, z], "vertical", -1)]],
        ["end", "G-G / Cross-section", FRONT, [
            dim("Width", [x0, mid_y, z], [x1, mid_y, z], "horizontal", 1)],
         section(-mid_y, [x0 - 0.25, z - Runner_height - 0.25, x1 + 0.25, z + 0.25])]]];

// Drawer members grouped across drawers with identical finished geometry.
// Member order follows drawer_members(): 0 bottom, 1 front, 2 left, 3 right, 4 back.
// Rounded to a millionth of an inch so derived heights group despite float noise.
function signature(i, k) = let(m = drawer_members(i)[k])
    [for (n = concat(m[2] - m[1], (k == 2 || k == 4) && !supported ? hang_center[i] : 0)) round(n * 1e6)];
function matching(i, k) = [for (j = [0:N-1]) if (signature(j, k) == signature(i, k)) j];
function representatives(k) = [for (i = [0:N-1]) if (matching(i, k)[0] == i) i];
// Drawer numbers with runs of three or more compressed, e.g. "1, 3–6".
function run_end(v, i) = i + 1 < len(v) && v[i+1] == v[i] + 1 ? run_end(v, i + 1) : i;
function runs(v, i = 0) = i >= len(v) ? "" : let(j = run_end(v, i))
    str(i > 0 ? ", " : "", j > i + 1 ? str(v[i], "–", v[j]) : j == i + 1 ? str(v[i], ", ", v[j]) : str(v[i]), runs(v, j + 1));
function drawers_title(name, set) = str(name, len(set) == 1 ? " · drawer " : " · drawers ", runs([for (j = set) j + 1]));
function lo_of(i, k) = drawer_origin(i) + drawer_members(i)[k][1];
function hi_of(i, k) = drawer_origin(i) + drawer_members(i)[k][2];
box_material = "Plywood; butt joints glued with screws, pocket screws or brads.";

function front_sheet(i) = let(set = matching(i, 1), lo = lo_of(i, 1), hi = hi_of(i, 1), xm = (lo[0] + hi[0]) / 2,
    g = Groove_depth, o = Groove_offset, tb = Bottom_thickness, top = min(hi[2], lo[2] + 2))
    [str("front-", i + 1), drawers_title("Drawer front", set), len(set), [
        "Integral inset front; the visible face is shown.", box_material,
        Box_construction == "front_back_overlap" ? "Runs the full box width; the sides butt into its back face." :
            "Fits between the sides, whose ends show on the face.",
        under_bottom ? str("Sits on the bottom panel, whose edge shows below it: ", frac(front_h[i]), " overall.") :
            str("Bottom groove ", frac(tb), " wide x ", frac(g), " deep, ", frac(o), " up, through the length.")],
     pc(member_piece(i, 1)), [
        ["face", "Face", FRONT, [
            dim("Width", [lo[0], lo[1], hi[2]], [hi[0], lo[1], hi[2]], "horizontal", 1),
            dim("Height", [lo[0], lo[1], lo[2]], [lo[0], lo[1], hi[2]], "vertical", -1)]],
        ["edge", "H-H / Section at the bottom edge", RIGHT, concat([
            dim("Thickness", [xm, lo[1], lo[2]], [xm, hi[1], lo[2]], "horizontal", -1)],
            under_bottom ? [] : [
                dim("Groove offset", [xm, hi[1], lo[2]], [xm, hi[1], lo[2] + o], "vertical", 1),
                dim("Groove", [xm, hi[1], lo[2] + o], [xm, hi[1], lo[2] + o + tb], "vertical", 1, 2),
                dim("Groove depth", [xm, hi[1] - g, lo[2] + o], [xm, hi[1], lo[2] + o], "horizontal", -1, 2)]),
         section(xm, [lo[1] - 0.25, lo[2] - 0.25, hi[1] + 0.25, top + 0.25], top < hi[2] ? ["top"] : [])]]];

function side_sheet(i) = let(set = matching(i, 2), lo = lo_of(i, 2), hi = hi_of(i, 2), oz = drawer_origin(i)[2],
    g = Groove_depth, o = Groove_offset, tb = Bottom_thickness, ym = (lo[1] + hi[1]) / 2,
    hung = !supported, hang_lo = oz + hang_center[i] - hang_groove_h / 2, hang_hi = oz + hang_center[i] + hang_groove_h / 2,
    hang_stop = hung && lo[1] < Front_thickness, grooved = !under_bottom,
    // Bottom-groove dimensions belong on the inside face, where the groove shows.
    groove_dims = [
        dim("Groove stop", [lo[0], lo[1], lo[2]], [lo[0], Front_thickness - g, lo[2]], "horizontal", -1),
        dim("Groove offset", [lo[0], hi[1], lo[2]], [lo[0], hi[1], lo[2] + o], "vertical", 1),
        dim("Groove", [lo[0], hi[1], lo[2] + o], [lo[0], hi[1], lo[2] + o + tb], "vertical", 1, 2)],
    top = min(hi[2], hung ? hang_hi + 0.75 : grooved ? lo[2] + o + tb + 0.75 : lo[2] + 1.5))
    [str("side-", i + 1), drawers_title("Drawer sides", set), 2 * len(set), concat([
        grooved || hang_stop ? "Make mirrored left/right pairs; the left side is shown." : "Left and right sides are identical.",
        box_material,
        Box_construction == "front_back_overlap" ? "Fits between the front and back." : "Runs the full box depth; the front and back fit between the sides."],
        under_bottom ? ["Sits on the bottom panel."] :
            [str("Stopped bottom groove ", frac(tb), " wide x ", frac(g), " deep, ", frac(o), " up, open at the back.")],
        hung ? [str("Runner groove ", frac(hang_groove_h), " wide x ", frac(Hang_groove_depth), " deep in the outside face, open at the back.")] : [],
        supported && box_h[i] < front_h[i] - 1e-9 ? [str("Lower than the front so it clears the runner above by ", frac(Runner_clearance), ".")] : []),
     pc(member_piece(i, 2)), concat([
        [hung ? "outside" : "inside", hung ? "Outside face" : "Inside face", hung ? LEFT : RIGHT, concat([
            dim("Length", [lo[0], lo[1], hi[2]], [lo[0], hi[1], hi[2]], "horizontal", 1),
            dim("Height", [lo[0], hi[1], lo[2]], [lo[0], hi[1], hi[2]], "vertical", -1, 2)],
            hung ? concat([
                dim("To runner groove", [lo[0], hi[1], lo[2]], [lo[0], hi[1], hang_lo], "vertical", -1),
                dim("Runner groove", [lo[0], lo[1], hang_lo], [lo[0], lo[1], hang_hi], "vertical", 1)],
                hang_stop ? [dim("Runner groove stop", [lo[0], lo[1], lo[2]], [lo[0], Front_thickness, lo[2]], "horizontal", -1)] : []) :
            grooved ? groove_dims : [])]],
        hung && grooved ? [["inside", "Inside face", RIGHT, groove_dims]] : [],
        [["section", "J-J / Cross-section", FRONT, concat([
            dim("Thickness", [lo[0], ym, lo[2]], [hi[0], ym, lo[2]], "horizontal", -1)],
            hung ? [dim("Runner groove depth", [lo[0], ym, hang_hi], [lo[0] + Hang_groove_depth, ym, hang_hi], "horizontal", 1)] : [],
            grooved ? [dim("Groove depth", [hi[0] - g, ym, lo[2] + o], [hi[0], ym, lo[2] + o], "horizontal", -1, 2)] : []),
         section(-ym, [lo[0] - 0.25, lo[2] - 0.25, hi[0] + 0.25, top + 0.25], top < hi[2] ? ["top"] : [])]])];

function back_member_sheet(i) = let(set = matching(i, 4), lo = lo_of(i, 4), hi = hi_of(i, 4), oz = drawer_origin(i)[2],
    xm = (lo[0] + hi[0]) / 2, notched = !supported && Box_construction == "front_back_overlap",
    hang_lo = oz + hang_center[i] - hang_groove_h / 2, hang_hi = oz + hang_center[i] + hang_groove_h / 2,
    top = min(hi[2], lo[2] + 1.5))
    [str("back-", i + 1), drawers_title("Drawer back", set), len(set), concat([
        box_material,
        Box_construction == "front_back_overlap" ? "Runs the full box width; the sides butt into its front face." : "Fits between the sides.",
        under_bottom ? "Sits on the bottom panel." : "Sits on the bottom, which slides in beneath it; nail the bottom up into it."],
        notched ? [str("Notch both ends for the runner grooves: ", frac(hang_groove_h), " high x ", frac(Hang_groove_depth), " deep.")] : []),
     pc(member_piece(i, 4)), [
        ["face", "Face", FRONT, concat([
            dim("Width", [lo[0], lo[1], hi[2]], [hi[0], lo[1], hi[2]], "horizontal", 1),
            dim("Height", [lo[0], lo[1], lo[2]], [lo[0], lo[1], hi[2]], "vertical", -1)],
            notched ? [
                dim("Notch depth", [hi[0] - Hang_groove_depth, lo[1], lo[2]], [hi[0], lo[1], lo[2]], "horizontal", -1),
                dim("To notch", [hi[0], lo[1], lo[2]], [hi[0], lo[1], hang_lo], "vertical", 1),
                dim("Notch", [hi[0], lo[1], hang_lo], [hi[0], lo[1], hang_hi], "vertical", 1)] : [])],
        ["edge", "K-K / Section at the bottom edge", RIGHT, [
            dim("Thickness", [xm, lo[1], lo[2]], [xm, hi[1], lo[2]], "horizontal", -1)],
         section(xm, [lo[1] - 0.25, lo[2] - 0.25, hi[1] + 0.25, top + 0.25], top < hi[2] ? ["top"] : [])]]];

function bottom_sheet(i) = let(set = matching(i, 0), lo = lo_of(i, 0), hi = hi_of(i, 0), xm = (lo[0] + hi[0]) / 2)
    [str("bottom-", i + 1), drawers_title("Drawer bottom", set), len(set), [
        str(frac(Bottom_thickness), " plywood."),
        under_bottom ? "Glue and brad it under the sides, front and back." :
            str("Slides into the ", frac(Groove_depth), "-deep grooves in the sides and front; nail it up into the back.")],
     pc(member_piece(i, 0)), [
        ["plan", "Plan", TOP, [
            dim("Width", [lo[0], lo[1], hi[2]], [hi[0], lo[1], hi[2]], "horizontal", -1),
            dim("Depth", [lo[0], lo[1], hi[2]], [lo[0], hi[1], hi[2]], "vertical", -1)]],
        ["edge", "L-L / Section at the front edge", RIGHT, [
            dim("Thickness", [xm, lo[1], lo[2]], [xm, lo[1], hi[2]], "vertical", -1)],
         section(xm, [lo[1] - 0.25, lo[2] - 0.25, lo[1] + 1.5, hi[2] + 0.25], ["right"])]]];

// ---------------------------------------------------------------------------
// Stock. Every case and drawer part is plywood, laid out on sheets at finished
// size: SHEET_PARTS_V1 rows are [id, name, material, quantity, thickness, width,
// length, grain, legend ids]. "length" grain keeps visible face grain along the
// part length; hidden parts may turn. Only the hardwood runners use the
// board-feet cut list. Defaults: 48 x 96 sheets, 1/8 kerf, no edge trim.
function plywood(th) = str(frac(th), " plywood");
function parity_ids(name, set) = [for (k = [0, 1]) if (len([for (j = set) if (j % 2 == k) 1]) > 0) str(name, k == 0 ? "-odd" : "-even")];
function member_size(i, k) = hi_of(i, k) - lo_of(i, k);
sheet_parts = concat([
    ["case-sides", "Case sides", plywood(t), 2, t, Depth, Height, "length", ["case-left", "case-right"]],
    let(o = Case_joinery == "rabbet" ? end_rabbet : 0)
    ["case-panels", "Case top and bottom", plywood(t), 2, t, inner_d, inner_w + 2 * o, "length", ["case-top", "case-bottom"]],
    ["back-panel", "Back panel", plywood(Back_thickness), 1, Back_thickness, inner_w + 2 * Back_rabbet_width, Height, "any", ["case-back"]]],
    [for (i = representatives(1)) let(set = matching(i, 1), z = member_size(i, 1))
        [str("front-", i + 1), drawers_title("Drawer front", set), plywood(Front_thickness), len(set), Front_thickness, z[2], z[0], "length", parity_ids("front", set)]],
    [for (i = representatives(2)) let(set = matching(i, 2), z = member_size(i, 2))
        [str("side-", i + 1), drawers_title("Drawer sides", set), plywood(Side_thickness), 2 * len(set), Side_thickness, z[2], z[1], "any", parity_ids("side", set)]],
    [for (i = representatives(4)) let(set = matching(i, 4), z = member_size(i, 4))
        [str("back-", i + 1), drawers_title("Drawer back", set), plywood(Box_back_thickness), len(set), Box_back_thickness, z[2], z[0], "any", parity_ids("back", set)]],
    [for (i = representatives(0)) let(set = matching(i, 0), z = member_size(i, 0))
        [str("bottom-", i + 1), drawers_title("Drawer bottom", set), plywood(Bottom_thickness), len(set), Bottom_thickness, z[1], z[0], "any", parity_ids("bottom", set)]]);
echo("SHEET_STOCK_V1", [96, 48, 0.125, 0]);
echo("SHEET_PARTS_V1", sheet_parts);
runner_section = [Runner_height, supported ? Runner_width + dado_depth : runner_reach];
echo("CUTLIST_STOCK_V1", [14, 10, 0.0625, 0.0625]);
if (len(runner_drawers) > 0) echo("CUTLIST_V1", [["runners", "Runner strip", "Hardwood", 2 * len(runner_drawers),
    min(runner_section), max(runner_section), inner_d - Front_thickness, "Runner strip"]]);

// Names for the viewer's individually selectable pieces, keyed by source color.
member_names = [["front", "front"], ["left", "left side"], ["right", "right side"], ["back", "back"], ["bottom", "bottom"]];
echo("PIECES_V1", concat(
    [for (i = runner_drawers) for (right = [false, true])
        [hex_color(runner_rgb_of(i, right)), str("Runner R", i + 1, right ? " · right" : " · left")]],
    [for (i = [0:N-1]) for (m = member_names) [hex_color(member_rgb(m[0], i)), str("Drawer ", i + 1, " ", m[1])]]));

if (!is_undef($misc_drawing) && $misc_drawing) {
    echo("DRAWING_V1", ["inches", concat(assembly_views, joint_views), joint_caption]);
    echo("PART_DRAWINGS_V1", concat(
        [case_side_sheet(), panel_sheet(), back_sheet()],
        len(runner_drawers) > 0 ? [runner_sheet()] : [],
        [for (i = representatives(1)) front_sheet(i)],
        [for (i = representatives(2)) side_sheet(i)],
        [for (i = representatives(4)) back_member_sheet(i)],
        [for (i = representatives(0)) bottom_sheet(i)]));
    drawing_cabinet();
} else {
    separation = Explosion_percent / 100;
    if (Part == "all") cabinet(separation);
    else if (Part == "carcass") carcass(separation);
    else drawer(Inspect_drawer - 1, separation);
}
